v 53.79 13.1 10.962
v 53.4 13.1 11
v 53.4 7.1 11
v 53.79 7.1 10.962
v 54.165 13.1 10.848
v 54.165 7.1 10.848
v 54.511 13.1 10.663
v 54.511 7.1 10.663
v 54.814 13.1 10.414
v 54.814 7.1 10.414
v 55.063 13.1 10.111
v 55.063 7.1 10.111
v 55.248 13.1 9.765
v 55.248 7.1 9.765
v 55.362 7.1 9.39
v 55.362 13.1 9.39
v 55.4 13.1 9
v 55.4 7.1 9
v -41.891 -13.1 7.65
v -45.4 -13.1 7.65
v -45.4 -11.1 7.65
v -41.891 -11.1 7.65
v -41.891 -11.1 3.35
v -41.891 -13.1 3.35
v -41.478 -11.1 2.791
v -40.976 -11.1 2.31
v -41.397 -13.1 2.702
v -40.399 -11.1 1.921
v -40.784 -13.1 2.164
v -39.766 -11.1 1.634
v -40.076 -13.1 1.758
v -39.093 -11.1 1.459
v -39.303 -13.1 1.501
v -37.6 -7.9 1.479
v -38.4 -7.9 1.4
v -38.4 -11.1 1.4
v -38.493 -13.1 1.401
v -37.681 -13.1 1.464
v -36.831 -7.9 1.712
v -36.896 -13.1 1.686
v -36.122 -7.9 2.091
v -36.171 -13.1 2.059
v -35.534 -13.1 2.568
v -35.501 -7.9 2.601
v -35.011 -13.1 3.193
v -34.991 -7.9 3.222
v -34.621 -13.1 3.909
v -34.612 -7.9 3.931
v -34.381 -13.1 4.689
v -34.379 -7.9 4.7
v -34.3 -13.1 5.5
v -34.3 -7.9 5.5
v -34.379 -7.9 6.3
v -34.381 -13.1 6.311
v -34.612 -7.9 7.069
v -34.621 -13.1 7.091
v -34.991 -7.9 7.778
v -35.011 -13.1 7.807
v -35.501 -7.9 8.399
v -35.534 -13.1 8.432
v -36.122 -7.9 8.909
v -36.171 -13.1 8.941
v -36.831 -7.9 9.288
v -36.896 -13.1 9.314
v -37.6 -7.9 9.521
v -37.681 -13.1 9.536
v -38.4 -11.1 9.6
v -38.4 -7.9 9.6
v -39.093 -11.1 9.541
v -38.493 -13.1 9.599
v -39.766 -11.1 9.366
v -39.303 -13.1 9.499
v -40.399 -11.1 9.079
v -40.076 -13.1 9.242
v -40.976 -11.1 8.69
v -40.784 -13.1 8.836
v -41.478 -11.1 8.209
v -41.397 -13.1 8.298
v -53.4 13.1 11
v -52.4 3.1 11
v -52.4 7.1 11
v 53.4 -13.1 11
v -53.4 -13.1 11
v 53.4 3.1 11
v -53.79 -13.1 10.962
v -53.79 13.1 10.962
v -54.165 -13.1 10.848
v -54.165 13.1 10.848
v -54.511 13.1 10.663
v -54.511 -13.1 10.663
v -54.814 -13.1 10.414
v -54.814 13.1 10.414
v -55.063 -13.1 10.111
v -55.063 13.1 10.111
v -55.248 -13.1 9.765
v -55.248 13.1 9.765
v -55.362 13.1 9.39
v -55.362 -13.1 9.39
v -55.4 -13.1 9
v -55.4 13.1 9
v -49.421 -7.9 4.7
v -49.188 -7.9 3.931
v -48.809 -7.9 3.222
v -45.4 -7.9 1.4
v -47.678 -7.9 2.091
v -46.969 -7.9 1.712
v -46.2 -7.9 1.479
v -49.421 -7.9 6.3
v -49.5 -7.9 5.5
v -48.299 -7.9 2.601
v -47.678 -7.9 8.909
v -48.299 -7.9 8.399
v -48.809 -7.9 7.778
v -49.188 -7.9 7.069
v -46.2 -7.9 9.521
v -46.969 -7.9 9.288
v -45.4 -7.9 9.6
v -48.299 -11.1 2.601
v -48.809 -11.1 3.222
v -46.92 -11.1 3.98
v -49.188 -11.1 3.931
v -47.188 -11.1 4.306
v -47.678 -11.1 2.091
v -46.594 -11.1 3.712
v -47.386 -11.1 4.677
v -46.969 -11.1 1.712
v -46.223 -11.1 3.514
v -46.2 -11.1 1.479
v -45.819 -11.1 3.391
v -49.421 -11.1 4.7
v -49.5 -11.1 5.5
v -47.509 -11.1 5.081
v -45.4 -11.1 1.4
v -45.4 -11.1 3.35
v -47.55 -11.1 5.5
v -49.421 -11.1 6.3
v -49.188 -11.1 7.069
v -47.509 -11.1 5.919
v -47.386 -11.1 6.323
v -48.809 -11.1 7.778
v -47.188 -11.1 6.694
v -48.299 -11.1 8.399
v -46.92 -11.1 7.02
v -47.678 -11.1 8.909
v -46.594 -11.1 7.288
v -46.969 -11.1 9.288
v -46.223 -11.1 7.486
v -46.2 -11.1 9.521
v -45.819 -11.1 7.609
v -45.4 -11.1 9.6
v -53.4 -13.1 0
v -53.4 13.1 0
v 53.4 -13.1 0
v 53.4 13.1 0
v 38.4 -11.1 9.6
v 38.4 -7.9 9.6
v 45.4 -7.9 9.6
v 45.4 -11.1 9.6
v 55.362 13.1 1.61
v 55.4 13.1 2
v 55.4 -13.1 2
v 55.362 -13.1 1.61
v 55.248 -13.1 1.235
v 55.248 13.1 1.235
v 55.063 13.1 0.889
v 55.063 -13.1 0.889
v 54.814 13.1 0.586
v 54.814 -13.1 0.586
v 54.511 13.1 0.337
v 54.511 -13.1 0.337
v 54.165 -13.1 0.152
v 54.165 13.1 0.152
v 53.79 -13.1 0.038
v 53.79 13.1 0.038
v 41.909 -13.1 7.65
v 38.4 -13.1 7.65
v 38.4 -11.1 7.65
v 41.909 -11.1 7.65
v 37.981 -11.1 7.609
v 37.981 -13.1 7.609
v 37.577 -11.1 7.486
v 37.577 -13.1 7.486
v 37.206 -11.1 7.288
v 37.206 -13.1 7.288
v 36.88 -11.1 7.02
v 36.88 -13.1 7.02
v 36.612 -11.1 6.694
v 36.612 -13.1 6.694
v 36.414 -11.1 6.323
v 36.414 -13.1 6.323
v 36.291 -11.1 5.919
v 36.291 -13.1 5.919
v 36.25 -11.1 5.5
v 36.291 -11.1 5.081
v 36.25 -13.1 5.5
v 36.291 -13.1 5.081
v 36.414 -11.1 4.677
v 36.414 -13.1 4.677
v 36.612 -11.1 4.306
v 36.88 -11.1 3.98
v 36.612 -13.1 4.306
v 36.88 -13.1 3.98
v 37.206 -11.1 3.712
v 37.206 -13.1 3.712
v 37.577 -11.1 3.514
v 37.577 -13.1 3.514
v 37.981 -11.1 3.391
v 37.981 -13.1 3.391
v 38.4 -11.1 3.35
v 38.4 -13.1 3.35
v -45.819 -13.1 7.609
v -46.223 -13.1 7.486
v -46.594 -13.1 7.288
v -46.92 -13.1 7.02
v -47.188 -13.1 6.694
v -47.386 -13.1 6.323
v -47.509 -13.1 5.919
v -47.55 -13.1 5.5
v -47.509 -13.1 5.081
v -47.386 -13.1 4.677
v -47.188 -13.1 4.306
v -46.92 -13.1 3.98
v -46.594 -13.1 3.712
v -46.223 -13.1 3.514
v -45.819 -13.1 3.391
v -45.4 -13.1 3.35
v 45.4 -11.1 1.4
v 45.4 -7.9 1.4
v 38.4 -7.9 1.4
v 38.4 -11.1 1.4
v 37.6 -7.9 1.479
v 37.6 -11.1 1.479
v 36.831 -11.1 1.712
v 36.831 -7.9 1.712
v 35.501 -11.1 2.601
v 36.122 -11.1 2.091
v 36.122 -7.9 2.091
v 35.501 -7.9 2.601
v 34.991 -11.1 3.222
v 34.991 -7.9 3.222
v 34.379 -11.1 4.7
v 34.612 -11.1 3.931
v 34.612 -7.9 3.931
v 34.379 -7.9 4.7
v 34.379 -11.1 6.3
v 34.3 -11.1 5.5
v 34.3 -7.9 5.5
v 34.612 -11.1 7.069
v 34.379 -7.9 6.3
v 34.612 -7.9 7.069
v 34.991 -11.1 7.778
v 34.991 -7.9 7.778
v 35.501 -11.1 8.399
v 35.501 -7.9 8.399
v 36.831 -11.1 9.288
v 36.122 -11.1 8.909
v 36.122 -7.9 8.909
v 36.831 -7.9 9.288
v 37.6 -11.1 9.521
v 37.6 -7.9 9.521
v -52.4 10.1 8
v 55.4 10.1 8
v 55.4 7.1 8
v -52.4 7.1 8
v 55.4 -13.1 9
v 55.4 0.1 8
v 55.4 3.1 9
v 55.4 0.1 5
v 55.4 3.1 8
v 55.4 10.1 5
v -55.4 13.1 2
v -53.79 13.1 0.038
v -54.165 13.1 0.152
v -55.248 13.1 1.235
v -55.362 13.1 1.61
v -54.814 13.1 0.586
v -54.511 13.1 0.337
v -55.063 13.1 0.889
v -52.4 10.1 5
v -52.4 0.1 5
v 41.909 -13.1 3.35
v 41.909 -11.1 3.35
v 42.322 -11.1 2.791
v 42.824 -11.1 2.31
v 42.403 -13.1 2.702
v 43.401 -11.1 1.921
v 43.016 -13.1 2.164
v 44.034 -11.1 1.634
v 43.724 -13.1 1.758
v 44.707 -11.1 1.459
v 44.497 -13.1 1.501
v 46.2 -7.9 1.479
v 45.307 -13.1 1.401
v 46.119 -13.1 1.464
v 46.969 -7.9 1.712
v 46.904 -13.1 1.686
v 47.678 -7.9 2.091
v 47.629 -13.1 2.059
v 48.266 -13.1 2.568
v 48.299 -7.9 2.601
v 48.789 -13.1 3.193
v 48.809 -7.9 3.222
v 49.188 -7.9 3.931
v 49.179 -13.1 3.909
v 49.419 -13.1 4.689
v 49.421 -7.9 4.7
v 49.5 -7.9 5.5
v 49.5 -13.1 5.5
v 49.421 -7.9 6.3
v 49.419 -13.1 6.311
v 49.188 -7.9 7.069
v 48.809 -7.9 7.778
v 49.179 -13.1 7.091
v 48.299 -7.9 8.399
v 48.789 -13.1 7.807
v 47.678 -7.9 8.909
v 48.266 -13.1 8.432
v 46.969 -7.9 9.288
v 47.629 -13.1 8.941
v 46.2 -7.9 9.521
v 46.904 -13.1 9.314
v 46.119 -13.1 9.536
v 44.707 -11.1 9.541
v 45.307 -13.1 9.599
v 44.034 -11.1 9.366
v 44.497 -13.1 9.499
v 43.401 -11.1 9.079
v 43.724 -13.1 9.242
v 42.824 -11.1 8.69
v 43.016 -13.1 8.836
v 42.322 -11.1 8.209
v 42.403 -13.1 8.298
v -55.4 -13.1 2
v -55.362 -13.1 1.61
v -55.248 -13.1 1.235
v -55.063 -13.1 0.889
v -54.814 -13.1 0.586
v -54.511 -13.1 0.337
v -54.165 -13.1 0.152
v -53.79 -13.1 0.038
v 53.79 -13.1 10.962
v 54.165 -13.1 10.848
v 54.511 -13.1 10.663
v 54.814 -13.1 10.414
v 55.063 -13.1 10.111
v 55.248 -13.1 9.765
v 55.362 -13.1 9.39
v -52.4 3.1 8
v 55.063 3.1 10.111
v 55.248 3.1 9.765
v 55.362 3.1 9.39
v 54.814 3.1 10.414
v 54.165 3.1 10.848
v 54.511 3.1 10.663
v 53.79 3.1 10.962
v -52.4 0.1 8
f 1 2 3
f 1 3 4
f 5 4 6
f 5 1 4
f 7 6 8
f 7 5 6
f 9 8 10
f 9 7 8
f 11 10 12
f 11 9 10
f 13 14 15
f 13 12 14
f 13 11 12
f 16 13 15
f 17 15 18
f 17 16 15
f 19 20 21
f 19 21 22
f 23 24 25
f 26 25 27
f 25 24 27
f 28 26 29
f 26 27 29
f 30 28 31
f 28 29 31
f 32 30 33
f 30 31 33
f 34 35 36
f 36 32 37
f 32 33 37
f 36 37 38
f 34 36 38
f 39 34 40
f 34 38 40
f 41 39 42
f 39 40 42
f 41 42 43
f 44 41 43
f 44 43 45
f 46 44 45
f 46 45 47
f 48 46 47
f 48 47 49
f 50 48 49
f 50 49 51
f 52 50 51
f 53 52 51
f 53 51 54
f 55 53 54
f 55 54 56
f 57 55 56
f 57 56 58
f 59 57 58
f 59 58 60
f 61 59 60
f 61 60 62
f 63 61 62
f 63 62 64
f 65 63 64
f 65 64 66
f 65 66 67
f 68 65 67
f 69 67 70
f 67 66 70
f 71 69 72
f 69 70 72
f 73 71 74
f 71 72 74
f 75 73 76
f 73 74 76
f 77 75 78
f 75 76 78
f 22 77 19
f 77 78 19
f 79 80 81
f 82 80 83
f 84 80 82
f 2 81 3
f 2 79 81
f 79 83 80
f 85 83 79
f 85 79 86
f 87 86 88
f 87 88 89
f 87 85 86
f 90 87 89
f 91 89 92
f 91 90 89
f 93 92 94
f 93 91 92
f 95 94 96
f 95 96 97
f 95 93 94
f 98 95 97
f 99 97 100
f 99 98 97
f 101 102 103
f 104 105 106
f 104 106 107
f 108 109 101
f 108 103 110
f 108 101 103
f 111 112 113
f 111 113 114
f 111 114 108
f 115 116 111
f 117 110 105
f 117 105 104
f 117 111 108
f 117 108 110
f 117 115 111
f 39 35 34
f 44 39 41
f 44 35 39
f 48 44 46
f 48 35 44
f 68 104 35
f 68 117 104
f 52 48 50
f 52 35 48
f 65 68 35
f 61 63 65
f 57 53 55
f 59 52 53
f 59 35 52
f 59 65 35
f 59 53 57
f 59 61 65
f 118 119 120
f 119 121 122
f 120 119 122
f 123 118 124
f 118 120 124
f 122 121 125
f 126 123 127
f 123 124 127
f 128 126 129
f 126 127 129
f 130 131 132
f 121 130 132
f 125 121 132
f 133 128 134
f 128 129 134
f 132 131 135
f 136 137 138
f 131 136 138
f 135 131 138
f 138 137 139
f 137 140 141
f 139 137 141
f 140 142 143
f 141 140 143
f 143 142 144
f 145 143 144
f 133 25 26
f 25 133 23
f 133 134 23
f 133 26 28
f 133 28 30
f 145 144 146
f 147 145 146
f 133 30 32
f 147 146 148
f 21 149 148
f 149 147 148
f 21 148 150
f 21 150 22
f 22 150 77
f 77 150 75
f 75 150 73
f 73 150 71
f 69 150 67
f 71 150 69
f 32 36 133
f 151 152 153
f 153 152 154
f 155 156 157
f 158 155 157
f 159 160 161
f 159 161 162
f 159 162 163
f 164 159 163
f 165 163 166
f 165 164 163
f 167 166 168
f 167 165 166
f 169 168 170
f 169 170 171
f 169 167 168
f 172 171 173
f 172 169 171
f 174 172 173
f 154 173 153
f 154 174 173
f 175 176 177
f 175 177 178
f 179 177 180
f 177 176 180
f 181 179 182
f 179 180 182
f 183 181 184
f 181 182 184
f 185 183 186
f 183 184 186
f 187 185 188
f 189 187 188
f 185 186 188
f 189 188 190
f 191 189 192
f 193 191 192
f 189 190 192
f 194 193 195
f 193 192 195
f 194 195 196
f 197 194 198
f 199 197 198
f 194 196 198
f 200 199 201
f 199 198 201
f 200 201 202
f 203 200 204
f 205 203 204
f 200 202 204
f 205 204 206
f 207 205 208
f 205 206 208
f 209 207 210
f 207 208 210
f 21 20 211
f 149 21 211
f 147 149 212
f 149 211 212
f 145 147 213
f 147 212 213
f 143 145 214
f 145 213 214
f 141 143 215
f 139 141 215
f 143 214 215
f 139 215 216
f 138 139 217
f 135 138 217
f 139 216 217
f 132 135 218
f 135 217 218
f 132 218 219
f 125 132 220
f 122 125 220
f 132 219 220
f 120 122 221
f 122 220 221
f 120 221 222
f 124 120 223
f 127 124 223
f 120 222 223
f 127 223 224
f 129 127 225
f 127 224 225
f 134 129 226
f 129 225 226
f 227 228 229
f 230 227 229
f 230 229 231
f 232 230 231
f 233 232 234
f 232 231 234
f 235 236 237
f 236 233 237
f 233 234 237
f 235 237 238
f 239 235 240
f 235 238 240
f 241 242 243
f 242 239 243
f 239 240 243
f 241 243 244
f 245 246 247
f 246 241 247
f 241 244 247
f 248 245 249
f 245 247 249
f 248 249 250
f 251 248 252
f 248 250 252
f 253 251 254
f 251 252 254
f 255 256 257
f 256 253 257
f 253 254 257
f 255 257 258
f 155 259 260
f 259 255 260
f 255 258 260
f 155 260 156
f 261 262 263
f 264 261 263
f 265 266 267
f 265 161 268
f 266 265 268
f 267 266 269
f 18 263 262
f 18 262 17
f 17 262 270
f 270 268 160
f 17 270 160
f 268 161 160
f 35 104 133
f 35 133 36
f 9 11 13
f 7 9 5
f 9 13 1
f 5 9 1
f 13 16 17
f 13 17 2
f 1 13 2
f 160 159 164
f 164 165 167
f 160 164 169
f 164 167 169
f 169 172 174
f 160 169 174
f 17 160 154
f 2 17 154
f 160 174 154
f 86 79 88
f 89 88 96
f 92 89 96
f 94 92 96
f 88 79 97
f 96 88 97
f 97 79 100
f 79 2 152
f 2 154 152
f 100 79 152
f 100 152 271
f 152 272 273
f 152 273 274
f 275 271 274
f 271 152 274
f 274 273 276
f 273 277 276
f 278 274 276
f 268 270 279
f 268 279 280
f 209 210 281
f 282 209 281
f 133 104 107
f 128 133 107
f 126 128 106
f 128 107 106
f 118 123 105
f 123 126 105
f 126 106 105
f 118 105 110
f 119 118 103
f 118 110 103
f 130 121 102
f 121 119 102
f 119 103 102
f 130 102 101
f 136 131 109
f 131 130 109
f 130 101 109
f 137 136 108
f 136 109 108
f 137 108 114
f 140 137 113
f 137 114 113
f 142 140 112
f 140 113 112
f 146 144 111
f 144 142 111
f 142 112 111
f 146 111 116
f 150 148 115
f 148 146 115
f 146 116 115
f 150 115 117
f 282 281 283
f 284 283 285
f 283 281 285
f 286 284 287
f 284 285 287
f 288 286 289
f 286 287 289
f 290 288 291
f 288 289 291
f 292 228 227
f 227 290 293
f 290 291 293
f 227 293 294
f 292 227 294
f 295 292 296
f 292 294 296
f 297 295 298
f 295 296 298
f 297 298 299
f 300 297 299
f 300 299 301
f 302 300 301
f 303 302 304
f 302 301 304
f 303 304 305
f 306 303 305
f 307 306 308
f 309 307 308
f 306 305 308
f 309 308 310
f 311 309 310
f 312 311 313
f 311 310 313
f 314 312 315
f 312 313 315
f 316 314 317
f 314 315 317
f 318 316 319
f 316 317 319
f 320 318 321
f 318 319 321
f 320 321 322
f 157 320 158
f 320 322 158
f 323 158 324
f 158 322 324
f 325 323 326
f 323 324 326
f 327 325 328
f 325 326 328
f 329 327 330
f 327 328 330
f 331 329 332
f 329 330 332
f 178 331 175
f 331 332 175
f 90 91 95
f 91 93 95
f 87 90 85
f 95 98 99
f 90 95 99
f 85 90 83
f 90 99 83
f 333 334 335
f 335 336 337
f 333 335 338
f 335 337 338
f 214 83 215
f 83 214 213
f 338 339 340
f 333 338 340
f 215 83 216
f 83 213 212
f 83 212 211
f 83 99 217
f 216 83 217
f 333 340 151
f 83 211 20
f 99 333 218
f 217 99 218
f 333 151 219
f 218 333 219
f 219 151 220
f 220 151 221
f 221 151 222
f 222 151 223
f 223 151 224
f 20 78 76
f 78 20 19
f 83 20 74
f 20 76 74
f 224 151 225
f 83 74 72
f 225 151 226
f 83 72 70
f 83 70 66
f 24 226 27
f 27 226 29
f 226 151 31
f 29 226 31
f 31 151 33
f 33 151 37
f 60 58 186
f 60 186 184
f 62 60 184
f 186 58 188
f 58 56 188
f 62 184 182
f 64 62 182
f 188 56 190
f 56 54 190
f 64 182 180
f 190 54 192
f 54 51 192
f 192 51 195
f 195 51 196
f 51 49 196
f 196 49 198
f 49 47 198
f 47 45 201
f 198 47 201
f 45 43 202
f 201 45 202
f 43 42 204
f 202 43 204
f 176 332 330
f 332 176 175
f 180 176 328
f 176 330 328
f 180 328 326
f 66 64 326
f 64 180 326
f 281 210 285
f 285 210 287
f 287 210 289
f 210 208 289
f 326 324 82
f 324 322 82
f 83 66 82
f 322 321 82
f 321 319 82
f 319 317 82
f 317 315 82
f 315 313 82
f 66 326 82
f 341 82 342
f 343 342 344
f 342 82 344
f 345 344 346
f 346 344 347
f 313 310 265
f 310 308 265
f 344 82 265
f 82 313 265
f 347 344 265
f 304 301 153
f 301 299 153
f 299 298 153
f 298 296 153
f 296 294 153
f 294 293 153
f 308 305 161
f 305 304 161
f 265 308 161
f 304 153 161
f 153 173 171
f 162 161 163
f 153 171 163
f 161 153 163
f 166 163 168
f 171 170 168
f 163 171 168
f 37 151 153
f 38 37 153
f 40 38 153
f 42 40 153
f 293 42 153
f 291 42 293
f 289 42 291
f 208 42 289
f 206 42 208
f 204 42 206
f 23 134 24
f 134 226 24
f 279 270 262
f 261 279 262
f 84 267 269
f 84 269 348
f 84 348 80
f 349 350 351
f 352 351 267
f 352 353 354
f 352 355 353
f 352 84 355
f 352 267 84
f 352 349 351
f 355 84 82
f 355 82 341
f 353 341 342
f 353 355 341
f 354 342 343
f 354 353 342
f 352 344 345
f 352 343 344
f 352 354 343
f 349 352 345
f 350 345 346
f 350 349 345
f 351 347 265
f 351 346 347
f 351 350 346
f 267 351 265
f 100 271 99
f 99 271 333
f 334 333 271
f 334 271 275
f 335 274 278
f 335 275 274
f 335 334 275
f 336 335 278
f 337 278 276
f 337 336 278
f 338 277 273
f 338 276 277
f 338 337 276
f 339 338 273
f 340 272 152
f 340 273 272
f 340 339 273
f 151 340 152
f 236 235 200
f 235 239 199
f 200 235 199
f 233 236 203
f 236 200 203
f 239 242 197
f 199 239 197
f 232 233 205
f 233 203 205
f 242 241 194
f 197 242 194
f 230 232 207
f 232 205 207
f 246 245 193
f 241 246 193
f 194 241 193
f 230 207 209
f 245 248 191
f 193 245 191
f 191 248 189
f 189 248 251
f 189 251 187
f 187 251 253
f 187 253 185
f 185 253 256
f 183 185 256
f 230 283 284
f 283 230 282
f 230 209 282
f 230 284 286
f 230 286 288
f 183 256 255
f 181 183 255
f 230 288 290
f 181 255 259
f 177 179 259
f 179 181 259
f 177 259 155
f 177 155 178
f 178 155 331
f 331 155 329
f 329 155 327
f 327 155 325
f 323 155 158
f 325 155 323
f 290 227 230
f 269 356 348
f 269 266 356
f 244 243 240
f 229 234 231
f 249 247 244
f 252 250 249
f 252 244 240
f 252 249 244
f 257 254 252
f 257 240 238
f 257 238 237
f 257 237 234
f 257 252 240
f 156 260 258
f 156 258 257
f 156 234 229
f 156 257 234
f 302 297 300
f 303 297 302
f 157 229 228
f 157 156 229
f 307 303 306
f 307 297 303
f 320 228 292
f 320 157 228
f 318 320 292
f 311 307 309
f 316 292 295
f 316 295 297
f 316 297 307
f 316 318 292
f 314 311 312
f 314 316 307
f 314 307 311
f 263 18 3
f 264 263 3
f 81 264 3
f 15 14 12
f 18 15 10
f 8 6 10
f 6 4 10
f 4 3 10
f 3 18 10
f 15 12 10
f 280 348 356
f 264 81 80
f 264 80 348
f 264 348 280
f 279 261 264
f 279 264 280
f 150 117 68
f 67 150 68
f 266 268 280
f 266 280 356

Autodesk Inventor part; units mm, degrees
ref_plane "YZ Plane" through (0, 0, 0) normal (1, 0, 0) x (0, 1, 0)
ref_plane "XZ Plane" through (0, 0, 0) normal (0, 1, 0) x (-1, 0, 0)
ref_plane "XY Plane" through (0, 0, 0) normal (0, 0, 1) x (1, 0, 0)
sketch "Sketch1" plane through (0, 0, 0) normal (0, 0, 1) x (1, 0, 0)
  line L0 (55.4, 13.1) -> (-55.4, 13.1)
  line L1 (-55.4, 13.1) -> (-55.4, -13.1)
  line L2 (-55.4, -13.1) -> (55.4, -13.1)
  line L3 (55.4, -13.1) -> (55.4, 13.1)
  line L4 (55.4, 13.1) -> (-55.4, -13.1) construction
  line L5 (-55.4, 13.1) -> (55.4, -13.1) construction
  point P0 (0, 0)
  dimension "d0" = 110.8
  dimension "d1" = 26.2
extrude "Extrusion1" add sketch "Sketch1" along normal blind 11
sketch "Sketch2" plane through (55.4, -13.1, 0) normal (1, 0, 0) x (0, 0, -1)
  line L0 (0, 0) -> (0, 26.2) projected
  line L1 (0, 26.2) -> (-11, 26.2) projected
  line L2 (-11, 0) -> (-11, 26.2) projected
  line L3 (0, 0) -> (-11, 0) projected
  line L4 (-11, 26.2) -> (-11, 0) projected
  line L5 (-11, 26.2) -> (-5, 26.2)
  line L6 (-5, 26.2) -> (-5, 23.2)
  line L7 (-5, 23.2) -> (-11, 23.2)
  line L8 (-11, 23.2) -> (-11, 26.2)
  line L9 (-11, 23.2) -> (-8, 23.2)
  line L10 (-8, 23.2) -> (-8, 20.2)
  line L11 (-8, 20.2) -> (-11, 20.2)
  line L12 (-11, 20.2) -> (-11, 23.2)
  line L13 (-11, 26.2) -> (-5, 26.2)
  line L14 (-5, 26.2) -> (-5, 10.2)
  line L15 (-5, 10.2) -> (-11, 10.2)
  line L16 (-11, 10.2) -> (-11, 26.2)
  line L17 (-11, 10.2) -> (-5, 10.2)
  line L18 (-5, 10.2) -> (-5, 13.2)
  line L19 (-5, 13.2) -> (-11, 13.2)
  line L20 (-11, 13.2) -> (-11, 10.2)
  line L21 (-11, 13.2) -> (-8, 13.2)
  line L22 (-8, 13.2) -> (-8, 16.2)
  line L23 (-8, 16.2) -> (-11, 16.2)
  line L24 (-11, 16.2) -> (-11, 13.2)
  point P0 (0, 13.1)
  point P1 (-11, 20.2)
  dimension "d4" = 6
  dimension "d5" = 3
  dimension "d6" = 3
  dimension "d7" = 3
  dimension "d8" = 16
  dimension "d9" = 3
  dimension "d10" = 3
  dimension "d11" = 3
extrude "Extrusion2" cut sketch "Sketch2" against normal blind 107.8 contours L14 L19 L22 L23 L2 L11 L10 L7
fillet "Fillet1" radius 2 5 edges at (55.4, 10.1, 11) (55.4, -5, 11) (-55.4, 0, 11) (55.4, 0, 0) (-55.4, 0, 0)
sketch "Sketch4" plane through (-53.4, -13.1, 0) normal (0, -1, 0) x (1, 0, 0)
  arc A0 (-2, 2) -> (0, 0) centre (0, 2) ccw projected
  line L0 (0, 0) -> (106.8, 0) projected
  arc A1 (106.8, 0) -> (108.8, 2) centre (106.8, 2) ccw projected
  line L1 (108.8, 2) -> (108.8, 9) projected
  arc A2 (108.8, 9) -> (106.8, 11) centre (106.8, 9) ccw projected
  line L2 (0, 11) -> (106.8, 11) projected
  arc A3 (0, 11) -> (-2, 9) centre (0, 9) ccw projected
  line L3 (-2, 2) -> (-2, 9) projected
  circle A4 centre (98.8, 5.5) radius 4.1
  circle A5 centre (91.8, 5.5) radius 2.15
  line L4 (91.8, 7.65) -> (95.3089, 7.65)
  line L5 (91.8, 3.35) -> (95.3089, 3.35)
  circle A6 centre (15, 5.5) radius 4.1
  circle A7 centre (8, 5.5) radius 2.15
  line L6 (8, 3.35) -> (11.5089, 3.35)
  line L7 (8, 7.65) -> (11.5089, 7.65)
  point P0 (53.4, 0)
  point P1 (108.8, 5.5)
  point P2 (12.2407, 8.5325)
  point P3 (8.4381, 3.3951)
  point P4 (11.1965, 3.9692)
  point P5 (-2, 5.5)
  dimension "d19" = 8.2
  dimension "d20" = 4.3
  dimension "d21" = 7
  dimension "d22" = 0
  dimension "d23" = 10
  dimension "d24" = 8.2
  dimension "d25" = 4.3
  dimension "d26" = 7
  dimension "d27" = 10
  dimension "d28" = 0
  dimension "d40" = 0
extrude "Extrusion4" cut sketch "Sketch4" against normal blind 5.2 contours A4 | A4 L5 A5 L4 | A5 | A6 | A6 L6 A7 L7 | A7
sketch "Sketch5" plane through (-53.4, -13.1, 0) normal (0, -1, 0) x (1, 0, 0)
  arc A0 (8, 7.65) -> (8, 3.35) centre (8, 5.5) ccw projected
  arc A1 (11.5089, 3.35) -> (11.5089, 7.65) centre (15, 5.5) ccw projected
  arc A2 (91.8, 7.65) -> (91.8, 3.35) centre (91.8, 5.5) ccw projected
  line L0 (91.8, 7.65) -> (95.3089, 7.65) projected
  arc A3 (95.3089, 3.35) -> (95.3089, 7.65) centre (98.8, 5.5) ccw projected
  line L1 (95.3089, 3.35) -> (91.8, 3.35) projected
  arc A4 (-2, 2) -> (0, 0) centre (0, 2) ccw projected
  line L2 (0, 0) -> (106.8, 0) projected
  arc A5 (106.8, 0) -> (108.8, 2) centre (106.8, 2) ccw projected
  line L3 (108.8, 2) -> (108.8, 9) projected
  arc A6 (108.8, 9) -> (106.8, 11) centre (106.8, 9) ccw projected
  line L4 (0, 11) -> (106.8, 11) projected
  arc A7 (0, 11) -> (-2, 9) centre (0, 9) ccw projected
  line L5 (-2, 2) -> (-2, 9) projected
  circle A8 centre (8, 5.5) radius 4.1
  line L6 (8, 9.6) -> (15, 9.6)
  line L7 (8, 1.4) -> (15, 1.4)
  arc A9 (11.5089, 3.35) -> (11.5089, 7.65) centre (15, 5.5) ccw projected
  circle A10 centre (91.8, 5.5) radius 4.1
  line L8 (91.8, 9.6) -> (98.8, 9.6)
  line L9 (98.8, 1.4) -> (91.8, 1.4)
  line L10 (8, 7.65) -> (11.5089, 7.65) projected
  line L11 (11.5089, 3.35) -> (8, 3.35) projected
  arc A11 (8, 7.65) -> (8, 3.35) centre (8, 5.5) ccw projected
  point P0 (53.4, 0)
  point P1 (19.1, 5.5)
  point P2 (19.1, 5.5)
  point P3 (5.85, 5.5)
  point P4 (89.65, 5.5)
  point P5 (12.4867, 2.2607)
  point P6 (12.4867, 8.7393)
  point P7 (96.275, 2.2698)
  point P8 (96.275, 8.7302)
  point P9 (5.85, 5.5)
  point P10 (95.2911, 7.65)
  point P11 (95.2911, 3.35)
  point P12 (11.4911, 3.35)
  point P13 (11.4911, 7.65)
  dimension "d32" = 8.2
  dimension "d33" = 0
  dimension "d35" = 8.2
  dimension "d36" = 0
  dimension "d42" = 0
  dimension "d43" = 0
extrude "Extrusion5" cut sketch "Sketch5" along normal blind 3.2 from surface at -5.2 contours L10 A8 L11 A0 | A0 L11 A8 L10 | A8 L6 A1 L10 | L11 A1 L7 A8 | L0 A10 L1 A2 | A2 L1 A10 L0 | A10 L8 A3 L0 | L1 A3 L9 A10
properties part number "module-slot" material "PC/ABS Plastic"
